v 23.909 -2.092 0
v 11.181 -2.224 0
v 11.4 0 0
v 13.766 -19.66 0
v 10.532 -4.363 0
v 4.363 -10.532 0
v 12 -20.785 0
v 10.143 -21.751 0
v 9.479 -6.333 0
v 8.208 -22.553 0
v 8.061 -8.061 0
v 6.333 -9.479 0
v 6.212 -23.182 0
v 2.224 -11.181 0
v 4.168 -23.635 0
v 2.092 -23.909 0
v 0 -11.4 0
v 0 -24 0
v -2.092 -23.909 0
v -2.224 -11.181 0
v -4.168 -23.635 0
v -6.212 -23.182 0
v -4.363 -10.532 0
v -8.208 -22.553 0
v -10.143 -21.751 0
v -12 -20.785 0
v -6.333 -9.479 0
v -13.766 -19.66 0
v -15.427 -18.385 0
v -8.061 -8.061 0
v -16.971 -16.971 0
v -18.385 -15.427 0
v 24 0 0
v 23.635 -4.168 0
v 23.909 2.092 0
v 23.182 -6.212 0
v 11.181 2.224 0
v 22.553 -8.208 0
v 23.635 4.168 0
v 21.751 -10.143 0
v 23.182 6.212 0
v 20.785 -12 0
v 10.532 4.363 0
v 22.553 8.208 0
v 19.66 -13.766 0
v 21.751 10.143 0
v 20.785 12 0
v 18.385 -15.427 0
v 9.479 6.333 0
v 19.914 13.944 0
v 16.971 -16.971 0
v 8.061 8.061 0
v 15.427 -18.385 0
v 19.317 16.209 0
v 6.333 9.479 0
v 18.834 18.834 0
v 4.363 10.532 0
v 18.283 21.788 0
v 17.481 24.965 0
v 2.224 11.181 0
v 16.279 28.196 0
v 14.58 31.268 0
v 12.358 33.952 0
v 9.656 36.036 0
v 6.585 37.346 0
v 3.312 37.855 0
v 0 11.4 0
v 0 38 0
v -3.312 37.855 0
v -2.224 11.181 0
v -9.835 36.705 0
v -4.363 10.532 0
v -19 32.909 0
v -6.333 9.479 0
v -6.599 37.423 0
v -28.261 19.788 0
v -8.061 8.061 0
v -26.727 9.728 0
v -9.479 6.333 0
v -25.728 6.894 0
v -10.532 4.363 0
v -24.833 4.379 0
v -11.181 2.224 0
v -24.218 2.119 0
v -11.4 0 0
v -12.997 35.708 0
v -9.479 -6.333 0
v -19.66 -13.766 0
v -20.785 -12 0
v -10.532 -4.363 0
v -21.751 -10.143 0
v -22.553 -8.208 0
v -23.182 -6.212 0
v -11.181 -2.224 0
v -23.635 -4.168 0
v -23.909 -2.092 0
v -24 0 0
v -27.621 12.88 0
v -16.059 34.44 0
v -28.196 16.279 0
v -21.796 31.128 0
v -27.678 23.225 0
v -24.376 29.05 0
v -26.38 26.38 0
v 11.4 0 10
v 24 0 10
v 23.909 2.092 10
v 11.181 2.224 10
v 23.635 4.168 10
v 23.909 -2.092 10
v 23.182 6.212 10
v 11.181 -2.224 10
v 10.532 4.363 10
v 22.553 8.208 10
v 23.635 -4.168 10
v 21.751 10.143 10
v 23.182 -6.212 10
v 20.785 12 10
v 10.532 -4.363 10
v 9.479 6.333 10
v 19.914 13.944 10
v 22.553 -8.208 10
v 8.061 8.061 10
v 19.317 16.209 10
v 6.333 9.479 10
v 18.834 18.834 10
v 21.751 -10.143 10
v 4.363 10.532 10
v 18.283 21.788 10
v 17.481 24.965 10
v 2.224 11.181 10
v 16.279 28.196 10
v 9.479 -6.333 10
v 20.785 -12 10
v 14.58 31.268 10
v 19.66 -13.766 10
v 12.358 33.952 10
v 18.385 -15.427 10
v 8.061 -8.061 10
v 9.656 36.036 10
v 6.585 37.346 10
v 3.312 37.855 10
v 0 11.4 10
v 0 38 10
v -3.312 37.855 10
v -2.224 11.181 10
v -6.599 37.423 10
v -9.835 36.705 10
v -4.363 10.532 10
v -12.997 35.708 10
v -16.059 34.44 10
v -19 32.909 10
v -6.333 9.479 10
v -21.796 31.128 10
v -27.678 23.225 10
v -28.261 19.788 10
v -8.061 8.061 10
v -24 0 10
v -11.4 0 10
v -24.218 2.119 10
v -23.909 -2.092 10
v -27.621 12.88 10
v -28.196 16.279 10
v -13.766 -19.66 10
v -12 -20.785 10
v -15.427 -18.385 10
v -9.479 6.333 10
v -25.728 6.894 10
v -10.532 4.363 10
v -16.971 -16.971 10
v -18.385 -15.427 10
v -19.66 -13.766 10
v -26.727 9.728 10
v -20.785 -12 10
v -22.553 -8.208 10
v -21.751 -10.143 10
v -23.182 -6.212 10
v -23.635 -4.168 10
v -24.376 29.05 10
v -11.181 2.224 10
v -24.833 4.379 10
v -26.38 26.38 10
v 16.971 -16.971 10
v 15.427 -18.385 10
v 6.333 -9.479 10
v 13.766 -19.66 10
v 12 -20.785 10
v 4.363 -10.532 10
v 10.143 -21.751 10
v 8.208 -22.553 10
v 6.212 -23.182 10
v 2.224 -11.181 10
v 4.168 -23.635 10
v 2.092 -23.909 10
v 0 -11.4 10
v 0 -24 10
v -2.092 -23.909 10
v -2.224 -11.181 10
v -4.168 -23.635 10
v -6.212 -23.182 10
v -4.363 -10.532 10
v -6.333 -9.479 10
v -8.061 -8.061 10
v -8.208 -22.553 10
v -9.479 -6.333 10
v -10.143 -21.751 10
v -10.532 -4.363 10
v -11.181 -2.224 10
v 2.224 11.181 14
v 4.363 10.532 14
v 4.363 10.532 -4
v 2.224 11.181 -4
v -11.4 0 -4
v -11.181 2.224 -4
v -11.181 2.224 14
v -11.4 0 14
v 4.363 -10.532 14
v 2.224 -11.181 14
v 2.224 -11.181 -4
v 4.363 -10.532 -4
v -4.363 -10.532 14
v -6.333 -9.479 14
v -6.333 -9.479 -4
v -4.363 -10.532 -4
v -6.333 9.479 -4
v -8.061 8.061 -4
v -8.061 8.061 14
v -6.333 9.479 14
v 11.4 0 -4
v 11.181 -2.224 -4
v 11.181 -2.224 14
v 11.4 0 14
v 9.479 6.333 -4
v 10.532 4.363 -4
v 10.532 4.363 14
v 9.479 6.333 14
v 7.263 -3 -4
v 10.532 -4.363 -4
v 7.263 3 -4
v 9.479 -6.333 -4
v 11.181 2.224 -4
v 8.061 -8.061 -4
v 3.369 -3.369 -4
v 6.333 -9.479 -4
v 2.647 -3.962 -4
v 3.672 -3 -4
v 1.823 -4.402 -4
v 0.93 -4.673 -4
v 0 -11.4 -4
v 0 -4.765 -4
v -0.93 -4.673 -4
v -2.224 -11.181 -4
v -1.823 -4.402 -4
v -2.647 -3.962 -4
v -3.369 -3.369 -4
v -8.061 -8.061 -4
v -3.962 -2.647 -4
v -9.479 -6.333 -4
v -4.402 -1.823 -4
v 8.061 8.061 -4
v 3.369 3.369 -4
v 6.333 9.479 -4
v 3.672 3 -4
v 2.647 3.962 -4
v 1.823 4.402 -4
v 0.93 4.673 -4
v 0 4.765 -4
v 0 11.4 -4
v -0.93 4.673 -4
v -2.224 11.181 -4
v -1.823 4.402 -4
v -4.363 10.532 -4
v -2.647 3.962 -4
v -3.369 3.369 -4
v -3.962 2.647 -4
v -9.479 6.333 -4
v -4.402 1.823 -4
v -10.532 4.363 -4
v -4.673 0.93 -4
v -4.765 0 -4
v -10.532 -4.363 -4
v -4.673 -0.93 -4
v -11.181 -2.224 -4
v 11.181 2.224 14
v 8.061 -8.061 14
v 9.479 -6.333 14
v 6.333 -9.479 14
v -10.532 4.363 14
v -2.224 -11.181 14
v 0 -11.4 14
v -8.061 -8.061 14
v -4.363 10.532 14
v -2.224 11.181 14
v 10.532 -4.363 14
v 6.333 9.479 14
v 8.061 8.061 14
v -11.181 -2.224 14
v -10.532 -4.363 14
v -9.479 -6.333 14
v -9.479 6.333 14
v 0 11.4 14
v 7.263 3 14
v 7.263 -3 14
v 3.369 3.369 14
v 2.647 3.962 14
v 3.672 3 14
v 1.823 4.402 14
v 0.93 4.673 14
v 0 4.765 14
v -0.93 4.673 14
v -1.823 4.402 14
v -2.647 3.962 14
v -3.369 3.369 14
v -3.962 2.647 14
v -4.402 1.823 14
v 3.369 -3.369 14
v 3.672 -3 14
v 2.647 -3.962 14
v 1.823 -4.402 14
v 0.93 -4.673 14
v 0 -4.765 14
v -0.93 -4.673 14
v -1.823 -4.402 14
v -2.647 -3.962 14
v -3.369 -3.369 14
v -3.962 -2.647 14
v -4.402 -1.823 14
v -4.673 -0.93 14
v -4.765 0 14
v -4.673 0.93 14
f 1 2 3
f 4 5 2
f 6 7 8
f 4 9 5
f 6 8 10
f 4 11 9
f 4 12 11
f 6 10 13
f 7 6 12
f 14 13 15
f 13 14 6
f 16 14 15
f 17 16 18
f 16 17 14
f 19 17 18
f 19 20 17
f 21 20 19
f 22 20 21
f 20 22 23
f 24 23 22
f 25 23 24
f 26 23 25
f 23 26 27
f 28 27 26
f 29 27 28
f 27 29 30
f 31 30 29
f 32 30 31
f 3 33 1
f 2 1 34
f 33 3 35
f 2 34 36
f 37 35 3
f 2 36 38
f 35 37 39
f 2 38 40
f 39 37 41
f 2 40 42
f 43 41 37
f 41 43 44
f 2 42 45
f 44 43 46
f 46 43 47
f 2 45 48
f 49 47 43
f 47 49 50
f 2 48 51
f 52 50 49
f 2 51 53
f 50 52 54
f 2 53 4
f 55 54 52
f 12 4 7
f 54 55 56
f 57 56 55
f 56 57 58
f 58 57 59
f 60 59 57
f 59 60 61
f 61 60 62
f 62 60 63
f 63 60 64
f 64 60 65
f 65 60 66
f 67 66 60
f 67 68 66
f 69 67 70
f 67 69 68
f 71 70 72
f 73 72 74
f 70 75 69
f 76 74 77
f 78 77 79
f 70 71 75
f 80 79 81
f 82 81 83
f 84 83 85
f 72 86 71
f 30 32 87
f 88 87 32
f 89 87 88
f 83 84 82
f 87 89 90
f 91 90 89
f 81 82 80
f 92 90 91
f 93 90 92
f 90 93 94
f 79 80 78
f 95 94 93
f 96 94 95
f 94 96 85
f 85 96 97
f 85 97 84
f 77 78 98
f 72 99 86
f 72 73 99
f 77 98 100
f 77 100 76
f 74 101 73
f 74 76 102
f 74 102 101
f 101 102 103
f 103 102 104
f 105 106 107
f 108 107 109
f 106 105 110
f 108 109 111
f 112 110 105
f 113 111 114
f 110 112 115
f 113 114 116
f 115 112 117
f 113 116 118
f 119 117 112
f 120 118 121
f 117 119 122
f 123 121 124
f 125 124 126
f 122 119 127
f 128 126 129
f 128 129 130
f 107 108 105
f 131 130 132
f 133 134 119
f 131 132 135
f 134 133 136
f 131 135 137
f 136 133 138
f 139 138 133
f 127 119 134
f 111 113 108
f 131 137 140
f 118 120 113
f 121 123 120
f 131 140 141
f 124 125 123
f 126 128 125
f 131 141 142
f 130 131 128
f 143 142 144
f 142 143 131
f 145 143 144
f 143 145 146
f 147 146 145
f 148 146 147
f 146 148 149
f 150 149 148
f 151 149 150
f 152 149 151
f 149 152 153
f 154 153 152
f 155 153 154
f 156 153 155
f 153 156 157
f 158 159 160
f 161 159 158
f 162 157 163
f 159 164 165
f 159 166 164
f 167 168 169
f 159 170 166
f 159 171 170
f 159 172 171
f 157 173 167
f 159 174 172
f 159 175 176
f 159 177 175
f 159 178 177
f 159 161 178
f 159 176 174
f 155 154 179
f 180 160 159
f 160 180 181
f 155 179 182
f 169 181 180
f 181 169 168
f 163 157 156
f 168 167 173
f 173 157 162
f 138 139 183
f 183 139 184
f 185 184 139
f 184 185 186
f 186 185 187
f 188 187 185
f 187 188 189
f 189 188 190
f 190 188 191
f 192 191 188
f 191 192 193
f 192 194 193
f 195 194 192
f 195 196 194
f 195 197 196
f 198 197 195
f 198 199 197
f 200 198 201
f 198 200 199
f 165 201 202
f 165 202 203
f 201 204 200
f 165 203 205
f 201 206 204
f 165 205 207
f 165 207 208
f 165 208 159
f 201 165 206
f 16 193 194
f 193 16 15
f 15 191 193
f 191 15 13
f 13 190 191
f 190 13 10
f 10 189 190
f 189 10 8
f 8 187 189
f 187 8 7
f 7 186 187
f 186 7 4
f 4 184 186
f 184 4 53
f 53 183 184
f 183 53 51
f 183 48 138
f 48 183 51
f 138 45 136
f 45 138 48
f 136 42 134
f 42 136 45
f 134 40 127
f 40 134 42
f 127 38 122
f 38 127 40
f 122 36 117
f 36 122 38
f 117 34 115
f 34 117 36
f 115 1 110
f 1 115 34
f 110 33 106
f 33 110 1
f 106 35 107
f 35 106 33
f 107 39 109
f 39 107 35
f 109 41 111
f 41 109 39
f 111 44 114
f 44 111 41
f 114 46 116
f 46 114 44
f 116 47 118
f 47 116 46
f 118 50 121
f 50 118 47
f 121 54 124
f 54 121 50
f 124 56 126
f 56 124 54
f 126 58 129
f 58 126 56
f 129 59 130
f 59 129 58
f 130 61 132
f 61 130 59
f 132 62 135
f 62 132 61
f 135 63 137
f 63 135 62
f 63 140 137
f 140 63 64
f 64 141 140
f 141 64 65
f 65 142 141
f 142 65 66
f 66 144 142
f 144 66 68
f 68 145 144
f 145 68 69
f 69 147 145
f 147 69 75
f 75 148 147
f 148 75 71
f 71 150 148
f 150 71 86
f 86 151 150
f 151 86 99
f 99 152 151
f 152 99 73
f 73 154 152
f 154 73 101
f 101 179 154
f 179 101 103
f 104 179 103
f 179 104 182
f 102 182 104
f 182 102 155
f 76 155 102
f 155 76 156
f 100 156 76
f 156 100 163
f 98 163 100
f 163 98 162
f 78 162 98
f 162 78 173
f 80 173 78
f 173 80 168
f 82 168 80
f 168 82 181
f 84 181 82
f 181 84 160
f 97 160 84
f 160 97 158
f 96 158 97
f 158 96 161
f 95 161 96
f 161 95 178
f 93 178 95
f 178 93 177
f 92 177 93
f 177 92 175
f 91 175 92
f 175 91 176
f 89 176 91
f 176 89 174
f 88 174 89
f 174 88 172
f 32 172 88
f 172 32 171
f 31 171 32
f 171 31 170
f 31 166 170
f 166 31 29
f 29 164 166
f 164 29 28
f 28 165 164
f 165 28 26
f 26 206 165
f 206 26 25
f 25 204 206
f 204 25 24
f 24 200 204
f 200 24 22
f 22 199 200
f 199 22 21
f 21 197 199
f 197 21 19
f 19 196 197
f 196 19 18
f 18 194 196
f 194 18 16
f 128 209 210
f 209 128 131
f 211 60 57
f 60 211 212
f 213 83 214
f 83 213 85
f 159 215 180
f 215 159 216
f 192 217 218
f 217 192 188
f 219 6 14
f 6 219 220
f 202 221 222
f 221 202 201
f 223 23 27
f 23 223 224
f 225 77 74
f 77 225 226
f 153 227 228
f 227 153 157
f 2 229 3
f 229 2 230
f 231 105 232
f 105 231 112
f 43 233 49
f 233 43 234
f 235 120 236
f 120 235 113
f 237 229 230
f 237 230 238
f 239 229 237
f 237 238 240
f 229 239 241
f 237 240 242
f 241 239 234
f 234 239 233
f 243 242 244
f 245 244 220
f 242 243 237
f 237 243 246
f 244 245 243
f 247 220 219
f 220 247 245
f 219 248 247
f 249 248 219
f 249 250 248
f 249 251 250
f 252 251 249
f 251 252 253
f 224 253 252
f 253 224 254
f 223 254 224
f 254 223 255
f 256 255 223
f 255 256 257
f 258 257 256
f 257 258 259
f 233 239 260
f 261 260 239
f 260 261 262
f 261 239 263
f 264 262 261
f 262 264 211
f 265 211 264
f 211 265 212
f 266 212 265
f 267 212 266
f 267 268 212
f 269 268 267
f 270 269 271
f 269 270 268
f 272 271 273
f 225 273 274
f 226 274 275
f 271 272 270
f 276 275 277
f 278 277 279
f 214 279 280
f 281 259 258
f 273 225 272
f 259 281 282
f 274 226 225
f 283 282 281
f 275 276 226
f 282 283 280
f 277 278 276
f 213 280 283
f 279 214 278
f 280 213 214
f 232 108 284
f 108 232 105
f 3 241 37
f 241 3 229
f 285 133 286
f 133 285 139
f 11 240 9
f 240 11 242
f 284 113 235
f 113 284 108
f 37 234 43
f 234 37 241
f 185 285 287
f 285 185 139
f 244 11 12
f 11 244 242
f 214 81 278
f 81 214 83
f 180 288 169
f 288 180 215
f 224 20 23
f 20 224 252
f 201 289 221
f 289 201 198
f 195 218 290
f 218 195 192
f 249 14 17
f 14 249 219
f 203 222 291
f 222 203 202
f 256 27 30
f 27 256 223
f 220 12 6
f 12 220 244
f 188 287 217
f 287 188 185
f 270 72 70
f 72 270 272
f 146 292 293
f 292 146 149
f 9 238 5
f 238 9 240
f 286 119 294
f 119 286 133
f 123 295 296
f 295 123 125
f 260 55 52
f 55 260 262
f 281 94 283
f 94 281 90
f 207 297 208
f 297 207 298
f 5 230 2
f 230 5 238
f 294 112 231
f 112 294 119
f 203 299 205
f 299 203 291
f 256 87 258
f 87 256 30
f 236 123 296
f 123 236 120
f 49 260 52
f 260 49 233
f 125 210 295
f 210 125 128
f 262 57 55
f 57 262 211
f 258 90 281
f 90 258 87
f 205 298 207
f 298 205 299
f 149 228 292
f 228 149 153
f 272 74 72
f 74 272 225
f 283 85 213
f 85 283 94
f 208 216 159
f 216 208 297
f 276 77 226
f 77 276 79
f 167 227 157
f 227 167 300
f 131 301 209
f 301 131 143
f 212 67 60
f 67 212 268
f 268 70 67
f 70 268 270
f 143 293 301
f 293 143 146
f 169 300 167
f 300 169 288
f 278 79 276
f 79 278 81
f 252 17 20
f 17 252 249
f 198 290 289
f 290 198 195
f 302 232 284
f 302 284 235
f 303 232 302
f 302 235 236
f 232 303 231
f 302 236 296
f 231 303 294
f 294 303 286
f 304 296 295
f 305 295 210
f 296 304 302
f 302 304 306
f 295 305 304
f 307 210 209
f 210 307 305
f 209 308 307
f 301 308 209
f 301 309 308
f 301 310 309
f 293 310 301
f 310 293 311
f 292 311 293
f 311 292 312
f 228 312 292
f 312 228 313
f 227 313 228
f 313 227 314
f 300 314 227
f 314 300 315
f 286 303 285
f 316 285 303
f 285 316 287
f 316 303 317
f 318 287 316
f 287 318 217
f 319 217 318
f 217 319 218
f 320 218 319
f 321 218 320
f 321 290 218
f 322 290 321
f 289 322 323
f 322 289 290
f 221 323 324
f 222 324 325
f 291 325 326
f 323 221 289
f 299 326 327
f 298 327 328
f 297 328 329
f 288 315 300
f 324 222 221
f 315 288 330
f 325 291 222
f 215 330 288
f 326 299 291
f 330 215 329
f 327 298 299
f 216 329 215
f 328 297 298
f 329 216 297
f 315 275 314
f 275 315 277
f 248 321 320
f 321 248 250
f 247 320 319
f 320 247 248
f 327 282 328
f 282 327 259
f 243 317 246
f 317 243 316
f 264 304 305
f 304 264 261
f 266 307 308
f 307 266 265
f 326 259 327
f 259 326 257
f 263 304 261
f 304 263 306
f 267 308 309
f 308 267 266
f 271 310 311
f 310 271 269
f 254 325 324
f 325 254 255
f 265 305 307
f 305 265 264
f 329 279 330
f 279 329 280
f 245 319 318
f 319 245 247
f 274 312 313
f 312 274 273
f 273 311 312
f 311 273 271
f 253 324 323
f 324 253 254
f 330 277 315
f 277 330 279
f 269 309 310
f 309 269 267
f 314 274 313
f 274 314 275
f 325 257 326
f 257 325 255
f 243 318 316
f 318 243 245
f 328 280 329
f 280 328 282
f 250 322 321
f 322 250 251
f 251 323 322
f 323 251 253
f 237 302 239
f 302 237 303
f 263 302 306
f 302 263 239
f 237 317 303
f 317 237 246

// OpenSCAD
$fn = 32;

// ----------------------------------------------------------------------
// Cam: base radius 24 mm with a 14 mm lift over 150 degrees
// ----------------------------------------------------------------------

// --- parameters (mm) ---
base_r = 24;              // base radius
lift = 14;                // lift height above the base radius
lift_span = 150;          // angular width of the lift
lift_start = 30;          // angle where the lift starts
cam_t = 10;               // cam plate thickness
hub_d = 22.8;             // hub diameter
hub_h = 18;               // hub height
bore_d = 9.53;            // bore
key_w = 6;                // keyway width
key_depth = 3;            // keyway depth

cam_profile = [[24, 0], [23.909, 2.092], [23.635, 4.168], [23.182, 6.212], [22.553, 8.208], [21.751, 10.143], [20.785, 12], [19.914, 13.944], [19.317, 16.209], [18.834, 18.834], [18.283, 21.788], [17.481, 24.965], [16.279, 28.196], [14.58, 31.268], [12.358, 33.952], [9.656, 36.036], [6.585, 37.346], [3.312, 37.855], [0, 38], [-3.312, 37.855], [-6.599, 37.423], [-9.835, 36.705], [-12.997, 35.708], [-16.059, 34.44], [-19, 32.909], [-21.796, 31.128], [-24.376, 29.05], [-26.38, 26.38], [-27.678, 23.225], [-28.261, 19.788], [-28.196, 16.279], [-27.621, 12.88], [-26.727, 9.728], [-25.728, 6.894], [-24.833, 4.379], [-24.218, 2.119], [-24, 0], [-23.909, -2.092], [-23.635, -4.168], [-23.182, -6.212], [-22.553, -8.208], [-21.751, -10.143], [-20.785, -12], [-19.66, -13.766], [-18.385, -15.427], [-16.971, -16.971], [-15.427, -18.385], [-13.766, -19.66], [-12, -20.785], [-10.143, -21.751], [-8.208, -22.553], [-6.212, -23.182], [-4.168, -23.635], [-2.092, -23.909], [0, -24], [2.092, -23.909], [4.168, -23.635], [6.212, -23.182], [8.208, -22.553], [10.143, -21.751], [12, -20.785], [13.766, -19.66], [15.427, -18.385], [16.971, -16.971], [18.385, -15.427], [19.66, -13.766], [20.785, -12], [21.751, -10.143], [22.553, -8.208], [23.182, -6.212], [23.635, -4.168], [23.909, -2.092]];

difference() {
  union() {
    linear_extrude(height = cam_t) polygon(cam_profile);
    /* hub, proud of the cam plate on both sides */
    translate([0, 0, -4]) cylinder(h = hub_h, d = hub_d);
  }
  /* bore through the hub, 2.5 mm clear on both faces */
  translate([0, 0, -6.5]) cylinder(h = hub_h + 5, d = bore_d);
  /* keyway, milled through the whole hub */
  translate([1.763, -3, -6.5]) cube([5.5, 6, 23]);
}
